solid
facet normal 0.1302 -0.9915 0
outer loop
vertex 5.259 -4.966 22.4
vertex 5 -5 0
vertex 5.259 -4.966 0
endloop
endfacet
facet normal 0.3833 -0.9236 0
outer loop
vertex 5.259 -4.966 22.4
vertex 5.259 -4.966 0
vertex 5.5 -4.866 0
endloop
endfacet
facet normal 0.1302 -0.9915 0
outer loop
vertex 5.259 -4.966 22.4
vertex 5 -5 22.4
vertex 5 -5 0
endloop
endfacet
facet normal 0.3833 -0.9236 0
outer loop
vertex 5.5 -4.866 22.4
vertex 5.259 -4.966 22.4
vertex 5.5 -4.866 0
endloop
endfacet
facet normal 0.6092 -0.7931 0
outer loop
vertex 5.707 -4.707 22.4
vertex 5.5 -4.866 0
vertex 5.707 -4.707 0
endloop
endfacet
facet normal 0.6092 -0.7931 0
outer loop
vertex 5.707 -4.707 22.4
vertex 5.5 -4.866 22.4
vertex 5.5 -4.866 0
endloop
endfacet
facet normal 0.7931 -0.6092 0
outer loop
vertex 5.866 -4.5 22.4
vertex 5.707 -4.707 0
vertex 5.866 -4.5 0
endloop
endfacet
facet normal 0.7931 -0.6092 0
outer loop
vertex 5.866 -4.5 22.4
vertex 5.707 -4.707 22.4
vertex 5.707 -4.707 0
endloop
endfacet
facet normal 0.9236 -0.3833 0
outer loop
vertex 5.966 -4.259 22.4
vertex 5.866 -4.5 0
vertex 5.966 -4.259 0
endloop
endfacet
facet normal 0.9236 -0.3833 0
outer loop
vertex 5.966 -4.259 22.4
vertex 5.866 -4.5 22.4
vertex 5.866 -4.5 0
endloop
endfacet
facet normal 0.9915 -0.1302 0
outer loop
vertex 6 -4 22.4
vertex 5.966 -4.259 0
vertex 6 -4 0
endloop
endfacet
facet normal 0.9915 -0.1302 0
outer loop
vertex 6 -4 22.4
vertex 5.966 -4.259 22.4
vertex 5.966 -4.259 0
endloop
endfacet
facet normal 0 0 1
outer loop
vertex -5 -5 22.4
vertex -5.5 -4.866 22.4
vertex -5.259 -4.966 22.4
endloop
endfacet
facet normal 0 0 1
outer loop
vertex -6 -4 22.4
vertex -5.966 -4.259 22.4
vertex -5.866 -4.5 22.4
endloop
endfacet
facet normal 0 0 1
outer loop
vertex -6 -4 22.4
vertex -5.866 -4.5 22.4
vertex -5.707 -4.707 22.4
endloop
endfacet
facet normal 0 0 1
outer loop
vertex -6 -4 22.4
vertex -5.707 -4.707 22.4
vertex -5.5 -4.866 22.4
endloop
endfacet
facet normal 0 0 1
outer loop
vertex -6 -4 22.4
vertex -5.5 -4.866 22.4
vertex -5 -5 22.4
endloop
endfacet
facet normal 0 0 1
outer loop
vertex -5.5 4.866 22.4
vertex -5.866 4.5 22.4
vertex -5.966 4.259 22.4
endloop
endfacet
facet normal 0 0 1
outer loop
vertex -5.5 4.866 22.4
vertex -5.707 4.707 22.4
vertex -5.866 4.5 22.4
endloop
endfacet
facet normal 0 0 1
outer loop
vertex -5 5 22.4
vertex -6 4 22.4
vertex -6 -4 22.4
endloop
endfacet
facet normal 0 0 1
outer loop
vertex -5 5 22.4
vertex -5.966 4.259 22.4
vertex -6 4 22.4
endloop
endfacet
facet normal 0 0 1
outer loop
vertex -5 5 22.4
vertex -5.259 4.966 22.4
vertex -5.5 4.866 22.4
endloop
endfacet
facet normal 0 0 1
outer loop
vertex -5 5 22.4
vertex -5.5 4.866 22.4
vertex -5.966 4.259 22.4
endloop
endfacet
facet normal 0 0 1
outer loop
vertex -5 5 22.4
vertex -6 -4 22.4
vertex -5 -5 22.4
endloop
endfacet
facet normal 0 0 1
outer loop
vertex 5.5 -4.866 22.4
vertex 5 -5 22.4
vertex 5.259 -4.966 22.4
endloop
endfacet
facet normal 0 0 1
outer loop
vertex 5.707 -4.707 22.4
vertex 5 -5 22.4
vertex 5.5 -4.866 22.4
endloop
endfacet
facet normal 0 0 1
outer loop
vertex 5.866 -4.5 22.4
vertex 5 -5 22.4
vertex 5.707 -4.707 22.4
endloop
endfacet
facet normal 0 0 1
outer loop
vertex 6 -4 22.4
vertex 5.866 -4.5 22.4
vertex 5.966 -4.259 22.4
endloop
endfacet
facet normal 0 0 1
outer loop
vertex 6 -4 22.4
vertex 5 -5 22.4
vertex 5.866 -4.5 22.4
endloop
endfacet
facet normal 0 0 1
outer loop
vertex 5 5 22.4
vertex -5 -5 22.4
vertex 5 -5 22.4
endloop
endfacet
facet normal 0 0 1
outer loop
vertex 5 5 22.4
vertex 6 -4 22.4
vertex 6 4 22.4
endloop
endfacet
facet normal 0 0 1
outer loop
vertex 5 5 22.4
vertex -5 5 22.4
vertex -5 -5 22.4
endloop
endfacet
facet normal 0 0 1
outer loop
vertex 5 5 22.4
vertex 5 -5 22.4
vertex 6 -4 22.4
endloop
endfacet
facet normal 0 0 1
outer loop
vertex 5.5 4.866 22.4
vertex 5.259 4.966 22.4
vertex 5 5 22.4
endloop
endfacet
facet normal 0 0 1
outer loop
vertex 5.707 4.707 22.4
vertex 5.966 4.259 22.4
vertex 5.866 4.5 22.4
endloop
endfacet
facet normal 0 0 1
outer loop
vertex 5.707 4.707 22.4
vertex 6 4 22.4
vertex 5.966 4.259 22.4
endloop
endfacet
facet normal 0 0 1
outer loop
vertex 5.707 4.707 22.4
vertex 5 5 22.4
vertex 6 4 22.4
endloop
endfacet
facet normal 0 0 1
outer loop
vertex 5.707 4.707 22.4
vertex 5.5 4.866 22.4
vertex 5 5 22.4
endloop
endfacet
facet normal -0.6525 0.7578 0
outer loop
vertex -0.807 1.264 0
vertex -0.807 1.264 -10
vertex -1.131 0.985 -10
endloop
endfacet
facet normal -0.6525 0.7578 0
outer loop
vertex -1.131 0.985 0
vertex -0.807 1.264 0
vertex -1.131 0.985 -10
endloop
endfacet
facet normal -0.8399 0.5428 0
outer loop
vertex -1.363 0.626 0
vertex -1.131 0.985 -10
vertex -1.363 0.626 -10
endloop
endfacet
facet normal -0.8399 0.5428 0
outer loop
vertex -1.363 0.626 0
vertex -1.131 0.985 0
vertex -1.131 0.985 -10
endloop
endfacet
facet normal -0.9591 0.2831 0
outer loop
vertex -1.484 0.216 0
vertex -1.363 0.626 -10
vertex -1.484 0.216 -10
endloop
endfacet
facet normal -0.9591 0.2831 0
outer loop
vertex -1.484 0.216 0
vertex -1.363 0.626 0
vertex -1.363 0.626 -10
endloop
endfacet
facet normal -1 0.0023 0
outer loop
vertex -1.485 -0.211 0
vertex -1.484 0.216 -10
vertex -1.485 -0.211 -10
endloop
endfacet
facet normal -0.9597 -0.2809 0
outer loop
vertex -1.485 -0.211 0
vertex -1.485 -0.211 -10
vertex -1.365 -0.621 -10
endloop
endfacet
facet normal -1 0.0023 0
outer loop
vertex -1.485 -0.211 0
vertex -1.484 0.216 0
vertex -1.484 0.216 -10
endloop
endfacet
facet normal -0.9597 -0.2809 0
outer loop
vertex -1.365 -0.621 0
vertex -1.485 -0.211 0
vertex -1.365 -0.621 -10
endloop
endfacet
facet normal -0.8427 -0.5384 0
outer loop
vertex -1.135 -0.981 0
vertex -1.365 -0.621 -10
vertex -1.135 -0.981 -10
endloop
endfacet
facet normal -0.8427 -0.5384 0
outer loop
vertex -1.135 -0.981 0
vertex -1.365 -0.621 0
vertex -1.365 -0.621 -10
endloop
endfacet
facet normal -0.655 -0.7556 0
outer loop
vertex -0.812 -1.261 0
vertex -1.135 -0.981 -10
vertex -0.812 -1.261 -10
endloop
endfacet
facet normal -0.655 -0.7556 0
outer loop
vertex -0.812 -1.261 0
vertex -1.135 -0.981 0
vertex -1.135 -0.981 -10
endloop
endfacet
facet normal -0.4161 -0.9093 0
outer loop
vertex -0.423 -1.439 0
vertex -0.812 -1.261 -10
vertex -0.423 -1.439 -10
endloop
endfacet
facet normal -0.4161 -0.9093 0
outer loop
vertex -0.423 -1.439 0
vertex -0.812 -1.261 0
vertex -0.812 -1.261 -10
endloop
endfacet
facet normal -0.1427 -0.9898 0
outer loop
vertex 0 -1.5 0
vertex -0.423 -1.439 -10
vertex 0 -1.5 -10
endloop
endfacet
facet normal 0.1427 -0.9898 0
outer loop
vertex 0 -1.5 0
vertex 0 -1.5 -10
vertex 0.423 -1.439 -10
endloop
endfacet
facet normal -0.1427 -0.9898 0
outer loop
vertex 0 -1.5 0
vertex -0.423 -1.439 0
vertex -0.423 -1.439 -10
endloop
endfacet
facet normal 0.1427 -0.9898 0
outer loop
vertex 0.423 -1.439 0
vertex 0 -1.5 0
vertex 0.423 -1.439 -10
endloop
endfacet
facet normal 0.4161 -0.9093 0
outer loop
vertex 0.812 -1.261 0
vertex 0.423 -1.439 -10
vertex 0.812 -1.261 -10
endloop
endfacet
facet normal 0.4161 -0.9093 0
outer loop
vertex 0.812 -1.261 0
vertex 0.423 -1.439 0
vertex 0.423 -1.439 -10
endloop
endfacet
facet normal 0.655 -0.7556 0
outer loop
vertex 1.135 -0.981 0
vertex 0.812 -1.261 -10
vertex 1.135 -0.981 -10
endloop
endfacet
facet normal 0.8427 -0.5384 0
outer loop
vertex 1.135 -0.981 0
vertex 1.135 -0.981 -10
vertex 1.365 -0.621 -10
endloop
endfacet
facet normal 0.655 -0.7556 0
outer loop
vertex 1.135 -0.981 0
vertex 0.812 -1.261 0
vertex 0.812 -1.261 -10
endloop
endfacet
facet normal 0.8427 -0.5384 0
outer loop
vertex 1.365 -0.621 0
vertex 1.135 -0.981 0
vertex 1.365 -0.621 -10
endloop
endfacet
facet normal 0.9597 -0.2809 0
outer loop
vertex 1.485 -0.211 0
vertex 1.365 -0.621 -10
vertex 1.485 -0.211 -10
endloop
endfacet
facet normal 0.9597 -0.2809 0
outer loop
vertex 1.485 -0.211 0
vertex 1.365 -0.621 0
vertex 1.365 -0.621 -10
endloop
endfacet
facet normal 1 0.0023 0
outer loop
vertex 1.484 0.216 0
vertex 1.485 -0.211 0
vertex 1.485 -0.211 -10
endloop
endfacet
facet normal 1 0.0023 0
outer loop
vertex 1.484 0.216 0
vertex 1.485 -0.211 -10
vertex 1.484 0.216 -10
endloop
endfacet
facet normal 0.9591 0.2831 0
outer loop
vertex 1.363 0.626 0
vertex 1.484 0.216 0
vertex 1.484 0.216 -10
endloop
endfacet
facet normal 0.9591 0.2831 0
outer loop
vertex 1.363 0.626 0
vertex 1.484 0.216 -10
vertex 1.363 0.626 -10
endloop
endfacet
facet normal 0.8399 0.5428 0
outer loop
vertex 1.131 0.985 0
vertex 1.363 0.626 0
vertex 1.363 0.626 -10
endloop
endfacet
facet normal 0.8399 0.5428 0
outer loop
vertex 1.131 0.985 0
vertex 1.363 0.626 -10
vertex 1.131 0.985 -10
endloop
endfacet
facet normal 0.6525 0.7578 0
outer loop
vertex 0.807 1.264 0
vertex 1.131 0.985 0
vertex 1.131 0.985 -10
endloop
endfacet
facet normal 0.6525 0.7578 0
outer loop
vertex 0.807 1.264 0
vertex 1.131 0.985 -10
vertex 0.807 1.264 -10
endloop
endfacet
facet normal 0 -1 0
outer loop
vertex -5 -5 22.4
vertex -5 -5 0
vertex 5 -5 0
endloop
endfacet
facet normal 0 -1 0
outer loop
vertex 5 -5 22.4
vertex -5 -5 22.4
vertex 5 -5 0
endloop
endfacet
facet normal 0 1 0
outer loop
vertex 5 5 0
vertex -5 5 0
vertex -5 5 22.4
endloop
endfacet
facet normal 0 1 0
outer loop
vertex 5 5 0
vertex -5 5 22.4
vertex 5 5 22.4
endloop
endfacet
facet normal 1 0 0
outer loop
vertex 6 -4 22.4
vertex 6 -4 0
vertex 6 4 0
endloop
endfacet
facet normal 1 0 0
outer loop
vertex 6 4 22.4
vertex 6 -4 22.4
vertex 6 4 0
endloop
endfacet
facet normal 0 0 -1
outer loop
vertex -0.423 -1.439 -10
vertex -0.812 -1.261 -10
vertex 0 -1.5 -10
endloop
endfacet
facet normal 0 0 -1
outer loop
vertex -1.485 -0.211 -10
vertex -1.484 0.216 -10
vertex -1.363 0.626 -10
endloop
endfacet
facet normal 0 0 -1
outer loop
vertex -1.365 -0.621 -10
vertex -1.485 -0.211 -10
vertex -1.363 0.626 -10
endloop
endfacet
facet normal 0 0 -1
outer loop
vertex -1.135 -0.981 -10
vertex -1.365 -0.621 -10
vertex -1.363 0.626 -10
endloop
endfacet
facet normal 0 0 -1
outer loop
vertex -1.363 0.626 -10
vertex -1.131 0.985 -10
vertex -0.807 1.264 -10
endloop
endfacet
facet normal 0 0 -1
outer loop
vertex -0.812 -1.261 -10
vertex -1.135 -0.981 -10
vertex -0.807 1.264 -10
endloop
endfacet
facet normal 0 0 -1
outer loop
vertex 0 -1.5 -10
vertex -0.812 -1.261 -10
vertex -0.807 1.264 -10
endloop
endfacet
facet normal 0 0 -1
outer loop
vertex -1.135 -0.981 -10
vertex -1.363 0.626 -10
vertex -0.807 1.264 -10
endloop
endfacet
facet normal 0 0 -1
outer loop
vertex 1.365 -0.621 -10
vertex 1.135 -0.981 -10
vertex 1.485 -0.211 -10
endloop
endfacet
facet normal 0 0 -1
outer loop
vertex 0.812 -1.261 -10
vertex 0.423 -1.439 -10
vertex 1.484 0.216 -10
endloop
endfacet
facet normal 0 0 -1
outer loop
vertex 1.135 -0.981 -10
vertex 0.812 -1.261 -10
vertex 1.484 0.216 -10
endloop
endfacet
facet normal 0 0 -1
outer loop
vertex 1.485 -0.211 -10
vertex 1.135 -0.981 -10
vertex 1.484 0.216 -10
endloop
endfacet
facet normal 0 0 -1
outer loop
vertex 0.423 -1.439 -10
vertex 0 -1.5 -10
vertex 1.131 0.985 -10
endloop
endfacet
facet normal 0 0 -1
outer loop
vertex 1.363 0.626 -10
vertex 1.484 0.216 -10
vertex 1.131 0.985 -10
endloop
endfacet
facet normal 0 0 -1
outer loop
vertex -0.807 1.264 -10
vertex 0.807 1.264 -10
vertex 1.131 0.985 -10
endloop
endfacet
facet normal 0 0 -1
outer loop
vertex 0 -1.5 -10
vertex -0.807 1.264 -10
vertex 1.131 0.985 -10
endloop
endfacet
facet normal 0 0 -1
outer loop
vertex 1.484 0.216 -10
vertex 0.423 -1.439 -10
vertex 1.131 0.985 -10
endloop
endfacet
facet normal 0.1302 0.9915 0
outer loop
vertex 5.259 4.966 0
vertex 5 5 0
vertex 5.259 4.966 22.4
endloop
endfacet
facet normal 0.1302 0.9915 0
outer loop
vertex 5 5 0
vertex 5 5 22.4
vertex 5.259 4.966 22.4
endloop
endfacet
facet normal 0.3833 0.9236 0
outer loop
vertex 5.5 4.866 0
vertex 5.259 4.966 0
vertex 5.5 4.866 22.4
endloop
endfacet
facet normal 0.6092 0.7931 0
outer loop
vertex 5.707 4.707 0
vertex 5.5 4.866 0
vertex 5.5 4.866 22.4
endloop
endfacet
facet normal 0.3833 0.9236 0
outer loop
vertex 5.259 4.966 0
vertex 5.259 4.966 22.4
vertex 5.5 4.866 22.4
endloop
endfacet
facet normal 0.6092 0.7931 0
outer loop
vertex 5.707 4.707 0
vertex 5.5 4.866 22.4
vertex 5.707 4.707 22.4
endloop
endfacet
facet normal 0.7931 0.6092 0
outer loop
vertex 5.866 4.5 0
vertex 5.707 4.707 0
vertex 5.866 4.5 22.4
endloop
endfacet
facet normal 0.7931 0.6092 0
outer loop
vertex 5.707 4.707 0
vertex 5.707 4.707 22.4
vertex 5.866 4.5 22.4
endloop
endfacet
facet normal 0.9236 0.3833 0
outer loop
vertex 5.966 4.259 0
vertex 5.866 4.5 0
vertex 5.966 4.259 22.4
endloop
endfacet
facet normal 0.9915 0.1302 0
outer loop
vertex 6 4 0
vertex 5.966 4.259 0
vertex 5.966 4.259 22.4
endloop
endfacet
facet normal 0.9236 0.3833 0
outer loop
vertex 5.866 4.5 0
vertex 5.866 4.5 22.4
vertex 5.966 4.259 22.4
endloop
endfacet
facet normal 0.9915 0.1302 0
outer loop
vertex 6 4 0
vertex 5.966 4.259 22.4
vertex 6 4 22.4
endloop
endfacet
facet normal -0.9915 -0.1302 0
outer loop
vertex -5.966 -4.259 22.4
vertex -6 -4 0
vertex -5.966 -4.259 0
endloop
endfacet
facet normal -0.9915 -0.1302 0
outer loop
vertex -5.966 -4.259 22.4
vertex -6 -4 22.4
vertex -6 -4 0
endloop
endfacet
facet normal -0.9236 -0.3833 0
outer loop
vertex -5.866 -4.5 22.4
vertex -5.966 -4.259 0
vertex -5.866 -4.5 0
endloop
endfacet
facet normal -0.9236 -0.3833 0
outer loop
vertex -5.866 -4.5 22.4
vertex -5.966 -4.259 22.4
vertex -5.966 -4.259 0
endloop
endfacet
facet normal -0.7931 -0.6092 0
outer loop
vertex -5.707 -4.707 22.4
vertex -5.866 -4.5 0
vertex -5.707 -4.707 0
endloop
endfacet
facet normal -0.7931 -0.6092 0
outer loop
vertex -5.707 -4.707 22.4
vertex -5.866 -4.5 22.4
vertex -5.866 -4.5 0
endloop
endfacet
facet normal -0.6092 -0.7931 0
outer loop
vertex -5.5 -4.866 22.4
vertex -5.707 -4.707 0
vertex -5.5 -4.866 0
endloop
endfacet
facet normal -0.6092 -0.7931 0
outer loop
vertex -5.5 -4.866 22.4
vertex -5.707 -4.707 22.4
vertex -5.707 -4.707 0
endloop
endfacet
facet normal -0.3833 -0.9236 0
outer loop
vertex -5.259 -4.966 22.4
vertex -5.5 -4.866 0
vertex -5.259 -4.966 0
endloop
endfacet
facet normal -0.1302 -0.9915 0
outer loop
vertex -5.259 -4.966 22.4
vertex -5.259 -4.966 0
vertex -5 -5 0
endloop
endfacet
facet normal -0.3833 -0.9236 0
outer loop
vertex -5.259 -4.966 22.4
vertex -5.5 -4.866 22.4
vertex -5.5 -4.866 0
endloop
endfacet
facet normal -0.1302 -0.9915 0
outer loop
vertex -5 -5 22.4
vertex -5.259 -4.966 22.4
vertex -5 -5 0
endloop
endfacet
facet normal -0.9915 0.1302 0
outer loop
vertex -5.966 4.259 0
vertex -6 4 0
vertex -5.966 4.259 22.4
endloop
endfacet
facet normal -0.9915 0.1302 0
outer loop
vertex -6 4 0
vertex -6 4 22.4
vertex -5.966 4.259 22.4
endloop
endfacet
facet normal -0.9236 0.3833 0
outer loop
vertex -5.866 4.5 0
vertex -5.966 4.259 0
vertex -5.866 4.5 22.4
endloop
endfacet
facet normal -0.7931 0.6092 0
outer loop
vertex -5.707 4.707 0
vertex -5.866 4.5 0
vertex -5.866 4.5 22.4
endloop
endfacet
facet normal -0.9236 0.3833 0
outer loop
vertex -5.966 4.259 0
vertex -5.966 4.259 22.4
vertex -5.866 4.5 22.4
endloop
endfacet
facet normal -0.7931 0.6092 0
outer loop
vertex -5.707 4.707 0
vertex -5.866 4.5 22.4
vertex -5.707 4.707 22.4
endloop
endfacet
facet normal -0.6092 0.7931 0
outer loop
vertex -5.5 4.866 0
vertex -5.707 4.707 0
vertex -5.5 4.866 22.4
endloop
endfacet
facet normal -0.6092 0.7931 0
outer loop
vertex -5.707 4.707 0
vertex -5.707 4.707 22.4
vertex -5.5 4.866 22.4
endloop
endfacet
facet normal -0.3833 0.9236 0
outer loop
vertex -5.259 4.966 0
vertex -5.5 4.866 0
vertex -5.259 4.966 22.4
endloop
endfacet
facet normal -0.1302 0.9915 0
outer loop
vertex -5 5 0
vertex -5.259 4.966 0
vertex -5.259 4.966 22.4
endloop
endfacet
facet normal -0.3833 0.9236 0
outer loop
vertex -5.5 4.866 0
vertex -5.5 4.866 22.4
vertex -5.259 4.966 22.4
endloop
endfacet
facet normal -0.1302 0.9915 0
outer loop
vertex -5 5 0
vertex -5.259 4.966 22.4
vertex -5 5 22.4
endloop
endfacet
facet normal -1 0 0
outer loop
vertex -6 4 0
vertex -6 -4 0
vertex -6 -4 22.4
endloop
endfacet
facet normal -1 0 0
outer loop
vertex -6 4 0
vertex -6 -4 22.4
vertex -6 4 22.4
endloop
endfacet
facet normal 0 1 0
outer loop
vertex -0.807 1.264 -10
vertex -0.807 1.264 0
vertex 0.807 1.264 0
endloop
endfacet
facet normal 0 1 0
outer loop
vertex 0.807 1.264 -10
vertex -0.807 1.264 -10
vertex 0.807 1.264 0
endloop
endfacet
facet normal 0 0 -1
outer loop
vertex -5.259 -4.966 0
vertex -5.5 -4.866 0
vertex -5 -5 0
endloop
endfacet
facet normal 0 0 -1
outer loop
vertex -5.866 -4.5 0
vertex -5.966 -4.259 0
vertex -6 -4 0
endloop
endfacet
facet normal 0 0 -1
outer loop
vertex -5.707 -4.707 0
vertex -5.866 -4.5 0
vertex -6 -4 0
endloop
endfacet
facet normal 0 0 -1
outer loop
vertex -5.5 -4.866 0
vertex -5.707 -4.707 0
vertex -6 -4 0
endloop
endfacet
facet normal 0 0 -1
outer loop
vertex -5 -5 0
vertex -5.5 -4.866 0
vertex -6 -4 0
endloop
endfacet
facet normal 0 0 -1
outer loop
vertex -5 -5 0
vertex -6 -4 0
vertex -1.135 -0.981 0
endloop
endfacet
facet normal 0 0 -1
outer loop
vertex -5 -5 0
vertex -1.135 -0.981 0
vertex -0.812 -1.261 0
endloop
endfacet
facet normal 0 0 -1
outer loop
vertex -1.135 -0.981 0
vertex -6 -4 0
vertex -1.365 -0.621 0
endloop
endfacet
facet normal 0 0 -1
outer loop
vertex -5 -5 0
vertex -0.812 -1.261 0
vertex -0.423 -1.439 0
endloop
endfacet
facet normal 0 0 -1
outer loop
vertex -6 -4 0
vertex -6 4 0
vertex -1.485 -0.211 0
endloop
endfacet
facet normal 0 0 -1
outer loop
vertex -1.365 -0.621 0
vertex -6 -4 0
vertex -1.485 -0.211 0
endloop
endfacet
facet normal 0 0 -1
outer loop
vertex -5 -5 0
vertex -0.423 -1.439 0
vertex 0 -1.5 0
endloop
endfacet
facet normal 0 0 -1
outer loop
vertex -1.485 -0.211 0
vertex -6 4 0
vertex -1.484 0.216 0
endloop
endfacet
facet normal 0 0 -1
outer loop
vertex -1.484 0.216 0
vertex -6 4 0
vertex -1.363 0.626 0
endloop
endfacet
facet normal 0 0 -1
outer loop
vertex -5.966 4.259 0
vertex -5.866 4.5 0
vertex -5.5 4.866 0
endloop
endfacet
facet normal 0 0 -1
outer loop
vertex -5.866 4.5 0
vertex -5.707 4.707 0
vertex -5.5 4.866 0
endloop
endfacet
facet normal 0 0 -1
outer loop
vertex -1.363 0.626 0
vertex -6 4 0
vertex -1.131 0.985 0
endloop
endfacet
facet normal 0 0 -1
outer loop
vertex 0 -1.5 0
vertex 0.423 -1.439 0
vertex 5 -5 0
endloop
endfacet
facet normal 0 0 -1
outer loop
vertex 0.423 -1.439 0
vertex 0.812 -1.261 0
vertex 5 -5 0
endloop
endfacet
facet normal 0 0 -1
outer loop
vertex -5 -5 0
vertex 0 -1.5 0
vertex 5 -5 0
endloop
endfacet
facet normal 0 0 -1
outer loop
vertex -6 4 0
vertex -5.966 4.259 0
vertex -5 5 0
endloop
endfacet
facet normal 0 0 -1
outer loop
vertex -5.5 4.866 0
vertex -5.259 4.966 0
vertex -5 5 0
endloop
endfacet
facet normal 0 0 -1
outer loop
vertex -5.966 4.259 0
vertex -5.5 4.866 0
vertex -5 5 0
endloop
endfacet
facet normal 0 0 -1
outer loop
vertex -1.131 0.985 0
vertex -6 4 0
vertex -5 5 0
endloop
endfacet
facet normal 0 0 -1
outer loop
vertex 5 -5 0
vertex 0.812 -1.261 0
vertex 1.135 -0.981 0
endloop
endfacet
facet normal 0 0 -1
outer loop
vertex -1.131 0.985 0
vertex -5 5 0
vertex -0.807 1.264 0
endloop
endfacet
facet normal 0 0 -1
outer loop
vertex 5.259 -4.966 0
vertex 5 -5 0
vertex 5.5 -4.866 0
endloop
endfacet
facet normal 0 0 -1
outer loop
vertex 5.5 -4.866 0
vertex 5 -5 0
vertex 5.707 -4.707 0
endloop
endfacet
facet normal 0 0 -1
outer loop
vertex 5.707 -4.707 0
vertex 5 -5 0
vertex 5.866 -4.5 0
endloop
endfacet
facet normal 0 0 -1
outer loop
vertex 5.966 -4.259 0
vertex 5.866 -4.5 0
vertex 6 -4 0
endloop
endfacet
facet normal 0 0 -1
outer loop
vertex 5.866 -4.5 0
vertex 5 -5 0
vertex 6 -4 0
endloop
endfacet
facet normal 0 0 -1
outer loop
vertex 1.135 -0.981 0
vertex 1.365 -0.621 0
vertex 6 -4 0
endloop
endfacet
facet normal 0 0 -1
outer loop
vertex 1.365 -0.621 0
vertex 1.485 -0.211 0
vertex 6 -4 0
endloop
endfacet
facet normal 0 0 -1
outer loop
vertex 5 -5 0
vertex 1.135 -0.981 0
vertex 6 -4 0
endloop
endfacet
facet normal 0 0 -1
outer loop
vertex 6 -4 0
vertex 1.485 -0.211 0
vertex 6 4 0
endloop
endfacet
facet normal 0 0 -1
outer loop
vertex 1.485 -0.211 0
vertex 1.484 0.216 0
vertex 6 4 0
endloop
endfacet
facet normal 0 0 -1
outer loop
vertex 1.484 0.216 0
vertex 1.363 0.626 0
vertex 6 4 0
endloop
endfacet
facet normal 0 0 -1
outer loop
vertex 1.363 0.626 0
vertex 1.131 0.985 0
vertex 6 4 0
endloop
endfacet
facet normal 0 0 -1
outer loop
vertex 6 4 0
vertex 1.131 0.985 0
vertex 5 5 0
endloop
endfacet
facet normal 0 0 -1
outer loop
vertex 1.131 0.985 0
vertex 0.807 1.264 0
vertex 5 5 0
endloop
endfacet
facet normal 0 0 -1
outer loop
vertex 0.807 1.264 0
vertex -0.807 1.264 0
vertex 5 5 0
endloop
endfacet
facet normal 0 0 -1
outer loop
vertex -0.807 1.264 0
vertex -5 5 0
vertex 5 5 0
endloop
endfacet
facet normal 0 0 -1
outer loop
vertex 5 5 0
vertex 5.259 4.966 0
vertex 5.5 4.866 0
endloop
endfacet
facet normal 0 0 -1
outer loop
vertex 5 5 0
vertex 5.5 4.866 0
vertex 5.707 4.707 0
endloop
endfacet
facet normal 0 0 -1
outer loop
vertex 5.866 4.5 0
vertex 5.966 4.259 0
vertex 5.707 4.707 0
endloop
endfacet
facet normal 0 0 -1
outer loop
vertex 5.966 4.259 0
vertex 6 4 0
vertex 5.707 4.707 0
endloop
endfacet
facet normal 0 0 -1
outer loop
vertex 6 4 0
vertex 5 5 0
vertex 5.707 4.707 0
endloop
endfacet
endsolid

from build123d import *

# Parameters (mm, degrees)
SKETCH_1_W          = 12
SKETCH_1_H          = 10
EXTRUDE_1_DEPTH     = 22.4
SKETCH_2_R          = 1.5
EXTRUDE_2_DEPTH     = 10
FILLET_1_R          = 1
FILLET_2_R          = 1
CUT_EXTRUDE_1_DEPTH = 10


with BuildPart() as part:
    # ｽｹｯﾁ1 → ﾎﾞｽ - 押し出し1 (new body)
    with BuildSketch(Plane.XY):
        Rectangle(SKETCH_1_W, SKETCH_1_H)
    extrude(amount=EXTRUDE_1_DEPTH)

    # ｽｹｯﾁ2 → ﾎﾞｽ - 押し出し2 (add)
    with BuildSketch(Plane.XY):
        Circle(SKETCH_2_R)
    extrude(amount=-EXTRUDE_2_DEPTH)

    # ﾌｨﾚｯﾄ1
    fillet_1_edges = [part.edges().sort_by_distance(p)[0] for p in [
        (-6, 5, 11.2),
    ]]
    fillet(fillet_1_edges, radius=FILLET_1_R)

    # ﾌｨﾚｯﾄ2
    fillet_2_edges = [part.edges().sort_by_distance(p)[0] for p in [
        (-6, -5, 11.2),
        (6, 5, 11.2),
        (6, -5, 11.2),
    ]]
    fillet(fillet_2_edges, radius=FILLET_2_R)

    # ｽｹｯﾁ3 → ｶｯﾄ - 押し出し1 (cut)
    with BuildSketch(Plane.XY):
        Polygon((0, 1.5), (-1.572523441, 1.5), (-1.572523441, 1.264308846), (1.824127191, 1.264308846), (1.824127191, 1.5), align=None)
    extrude(amount=-CUT_EXTRUDE_1_DEPTH, mode=Mode.SUBTRACT)


solid = part.part
